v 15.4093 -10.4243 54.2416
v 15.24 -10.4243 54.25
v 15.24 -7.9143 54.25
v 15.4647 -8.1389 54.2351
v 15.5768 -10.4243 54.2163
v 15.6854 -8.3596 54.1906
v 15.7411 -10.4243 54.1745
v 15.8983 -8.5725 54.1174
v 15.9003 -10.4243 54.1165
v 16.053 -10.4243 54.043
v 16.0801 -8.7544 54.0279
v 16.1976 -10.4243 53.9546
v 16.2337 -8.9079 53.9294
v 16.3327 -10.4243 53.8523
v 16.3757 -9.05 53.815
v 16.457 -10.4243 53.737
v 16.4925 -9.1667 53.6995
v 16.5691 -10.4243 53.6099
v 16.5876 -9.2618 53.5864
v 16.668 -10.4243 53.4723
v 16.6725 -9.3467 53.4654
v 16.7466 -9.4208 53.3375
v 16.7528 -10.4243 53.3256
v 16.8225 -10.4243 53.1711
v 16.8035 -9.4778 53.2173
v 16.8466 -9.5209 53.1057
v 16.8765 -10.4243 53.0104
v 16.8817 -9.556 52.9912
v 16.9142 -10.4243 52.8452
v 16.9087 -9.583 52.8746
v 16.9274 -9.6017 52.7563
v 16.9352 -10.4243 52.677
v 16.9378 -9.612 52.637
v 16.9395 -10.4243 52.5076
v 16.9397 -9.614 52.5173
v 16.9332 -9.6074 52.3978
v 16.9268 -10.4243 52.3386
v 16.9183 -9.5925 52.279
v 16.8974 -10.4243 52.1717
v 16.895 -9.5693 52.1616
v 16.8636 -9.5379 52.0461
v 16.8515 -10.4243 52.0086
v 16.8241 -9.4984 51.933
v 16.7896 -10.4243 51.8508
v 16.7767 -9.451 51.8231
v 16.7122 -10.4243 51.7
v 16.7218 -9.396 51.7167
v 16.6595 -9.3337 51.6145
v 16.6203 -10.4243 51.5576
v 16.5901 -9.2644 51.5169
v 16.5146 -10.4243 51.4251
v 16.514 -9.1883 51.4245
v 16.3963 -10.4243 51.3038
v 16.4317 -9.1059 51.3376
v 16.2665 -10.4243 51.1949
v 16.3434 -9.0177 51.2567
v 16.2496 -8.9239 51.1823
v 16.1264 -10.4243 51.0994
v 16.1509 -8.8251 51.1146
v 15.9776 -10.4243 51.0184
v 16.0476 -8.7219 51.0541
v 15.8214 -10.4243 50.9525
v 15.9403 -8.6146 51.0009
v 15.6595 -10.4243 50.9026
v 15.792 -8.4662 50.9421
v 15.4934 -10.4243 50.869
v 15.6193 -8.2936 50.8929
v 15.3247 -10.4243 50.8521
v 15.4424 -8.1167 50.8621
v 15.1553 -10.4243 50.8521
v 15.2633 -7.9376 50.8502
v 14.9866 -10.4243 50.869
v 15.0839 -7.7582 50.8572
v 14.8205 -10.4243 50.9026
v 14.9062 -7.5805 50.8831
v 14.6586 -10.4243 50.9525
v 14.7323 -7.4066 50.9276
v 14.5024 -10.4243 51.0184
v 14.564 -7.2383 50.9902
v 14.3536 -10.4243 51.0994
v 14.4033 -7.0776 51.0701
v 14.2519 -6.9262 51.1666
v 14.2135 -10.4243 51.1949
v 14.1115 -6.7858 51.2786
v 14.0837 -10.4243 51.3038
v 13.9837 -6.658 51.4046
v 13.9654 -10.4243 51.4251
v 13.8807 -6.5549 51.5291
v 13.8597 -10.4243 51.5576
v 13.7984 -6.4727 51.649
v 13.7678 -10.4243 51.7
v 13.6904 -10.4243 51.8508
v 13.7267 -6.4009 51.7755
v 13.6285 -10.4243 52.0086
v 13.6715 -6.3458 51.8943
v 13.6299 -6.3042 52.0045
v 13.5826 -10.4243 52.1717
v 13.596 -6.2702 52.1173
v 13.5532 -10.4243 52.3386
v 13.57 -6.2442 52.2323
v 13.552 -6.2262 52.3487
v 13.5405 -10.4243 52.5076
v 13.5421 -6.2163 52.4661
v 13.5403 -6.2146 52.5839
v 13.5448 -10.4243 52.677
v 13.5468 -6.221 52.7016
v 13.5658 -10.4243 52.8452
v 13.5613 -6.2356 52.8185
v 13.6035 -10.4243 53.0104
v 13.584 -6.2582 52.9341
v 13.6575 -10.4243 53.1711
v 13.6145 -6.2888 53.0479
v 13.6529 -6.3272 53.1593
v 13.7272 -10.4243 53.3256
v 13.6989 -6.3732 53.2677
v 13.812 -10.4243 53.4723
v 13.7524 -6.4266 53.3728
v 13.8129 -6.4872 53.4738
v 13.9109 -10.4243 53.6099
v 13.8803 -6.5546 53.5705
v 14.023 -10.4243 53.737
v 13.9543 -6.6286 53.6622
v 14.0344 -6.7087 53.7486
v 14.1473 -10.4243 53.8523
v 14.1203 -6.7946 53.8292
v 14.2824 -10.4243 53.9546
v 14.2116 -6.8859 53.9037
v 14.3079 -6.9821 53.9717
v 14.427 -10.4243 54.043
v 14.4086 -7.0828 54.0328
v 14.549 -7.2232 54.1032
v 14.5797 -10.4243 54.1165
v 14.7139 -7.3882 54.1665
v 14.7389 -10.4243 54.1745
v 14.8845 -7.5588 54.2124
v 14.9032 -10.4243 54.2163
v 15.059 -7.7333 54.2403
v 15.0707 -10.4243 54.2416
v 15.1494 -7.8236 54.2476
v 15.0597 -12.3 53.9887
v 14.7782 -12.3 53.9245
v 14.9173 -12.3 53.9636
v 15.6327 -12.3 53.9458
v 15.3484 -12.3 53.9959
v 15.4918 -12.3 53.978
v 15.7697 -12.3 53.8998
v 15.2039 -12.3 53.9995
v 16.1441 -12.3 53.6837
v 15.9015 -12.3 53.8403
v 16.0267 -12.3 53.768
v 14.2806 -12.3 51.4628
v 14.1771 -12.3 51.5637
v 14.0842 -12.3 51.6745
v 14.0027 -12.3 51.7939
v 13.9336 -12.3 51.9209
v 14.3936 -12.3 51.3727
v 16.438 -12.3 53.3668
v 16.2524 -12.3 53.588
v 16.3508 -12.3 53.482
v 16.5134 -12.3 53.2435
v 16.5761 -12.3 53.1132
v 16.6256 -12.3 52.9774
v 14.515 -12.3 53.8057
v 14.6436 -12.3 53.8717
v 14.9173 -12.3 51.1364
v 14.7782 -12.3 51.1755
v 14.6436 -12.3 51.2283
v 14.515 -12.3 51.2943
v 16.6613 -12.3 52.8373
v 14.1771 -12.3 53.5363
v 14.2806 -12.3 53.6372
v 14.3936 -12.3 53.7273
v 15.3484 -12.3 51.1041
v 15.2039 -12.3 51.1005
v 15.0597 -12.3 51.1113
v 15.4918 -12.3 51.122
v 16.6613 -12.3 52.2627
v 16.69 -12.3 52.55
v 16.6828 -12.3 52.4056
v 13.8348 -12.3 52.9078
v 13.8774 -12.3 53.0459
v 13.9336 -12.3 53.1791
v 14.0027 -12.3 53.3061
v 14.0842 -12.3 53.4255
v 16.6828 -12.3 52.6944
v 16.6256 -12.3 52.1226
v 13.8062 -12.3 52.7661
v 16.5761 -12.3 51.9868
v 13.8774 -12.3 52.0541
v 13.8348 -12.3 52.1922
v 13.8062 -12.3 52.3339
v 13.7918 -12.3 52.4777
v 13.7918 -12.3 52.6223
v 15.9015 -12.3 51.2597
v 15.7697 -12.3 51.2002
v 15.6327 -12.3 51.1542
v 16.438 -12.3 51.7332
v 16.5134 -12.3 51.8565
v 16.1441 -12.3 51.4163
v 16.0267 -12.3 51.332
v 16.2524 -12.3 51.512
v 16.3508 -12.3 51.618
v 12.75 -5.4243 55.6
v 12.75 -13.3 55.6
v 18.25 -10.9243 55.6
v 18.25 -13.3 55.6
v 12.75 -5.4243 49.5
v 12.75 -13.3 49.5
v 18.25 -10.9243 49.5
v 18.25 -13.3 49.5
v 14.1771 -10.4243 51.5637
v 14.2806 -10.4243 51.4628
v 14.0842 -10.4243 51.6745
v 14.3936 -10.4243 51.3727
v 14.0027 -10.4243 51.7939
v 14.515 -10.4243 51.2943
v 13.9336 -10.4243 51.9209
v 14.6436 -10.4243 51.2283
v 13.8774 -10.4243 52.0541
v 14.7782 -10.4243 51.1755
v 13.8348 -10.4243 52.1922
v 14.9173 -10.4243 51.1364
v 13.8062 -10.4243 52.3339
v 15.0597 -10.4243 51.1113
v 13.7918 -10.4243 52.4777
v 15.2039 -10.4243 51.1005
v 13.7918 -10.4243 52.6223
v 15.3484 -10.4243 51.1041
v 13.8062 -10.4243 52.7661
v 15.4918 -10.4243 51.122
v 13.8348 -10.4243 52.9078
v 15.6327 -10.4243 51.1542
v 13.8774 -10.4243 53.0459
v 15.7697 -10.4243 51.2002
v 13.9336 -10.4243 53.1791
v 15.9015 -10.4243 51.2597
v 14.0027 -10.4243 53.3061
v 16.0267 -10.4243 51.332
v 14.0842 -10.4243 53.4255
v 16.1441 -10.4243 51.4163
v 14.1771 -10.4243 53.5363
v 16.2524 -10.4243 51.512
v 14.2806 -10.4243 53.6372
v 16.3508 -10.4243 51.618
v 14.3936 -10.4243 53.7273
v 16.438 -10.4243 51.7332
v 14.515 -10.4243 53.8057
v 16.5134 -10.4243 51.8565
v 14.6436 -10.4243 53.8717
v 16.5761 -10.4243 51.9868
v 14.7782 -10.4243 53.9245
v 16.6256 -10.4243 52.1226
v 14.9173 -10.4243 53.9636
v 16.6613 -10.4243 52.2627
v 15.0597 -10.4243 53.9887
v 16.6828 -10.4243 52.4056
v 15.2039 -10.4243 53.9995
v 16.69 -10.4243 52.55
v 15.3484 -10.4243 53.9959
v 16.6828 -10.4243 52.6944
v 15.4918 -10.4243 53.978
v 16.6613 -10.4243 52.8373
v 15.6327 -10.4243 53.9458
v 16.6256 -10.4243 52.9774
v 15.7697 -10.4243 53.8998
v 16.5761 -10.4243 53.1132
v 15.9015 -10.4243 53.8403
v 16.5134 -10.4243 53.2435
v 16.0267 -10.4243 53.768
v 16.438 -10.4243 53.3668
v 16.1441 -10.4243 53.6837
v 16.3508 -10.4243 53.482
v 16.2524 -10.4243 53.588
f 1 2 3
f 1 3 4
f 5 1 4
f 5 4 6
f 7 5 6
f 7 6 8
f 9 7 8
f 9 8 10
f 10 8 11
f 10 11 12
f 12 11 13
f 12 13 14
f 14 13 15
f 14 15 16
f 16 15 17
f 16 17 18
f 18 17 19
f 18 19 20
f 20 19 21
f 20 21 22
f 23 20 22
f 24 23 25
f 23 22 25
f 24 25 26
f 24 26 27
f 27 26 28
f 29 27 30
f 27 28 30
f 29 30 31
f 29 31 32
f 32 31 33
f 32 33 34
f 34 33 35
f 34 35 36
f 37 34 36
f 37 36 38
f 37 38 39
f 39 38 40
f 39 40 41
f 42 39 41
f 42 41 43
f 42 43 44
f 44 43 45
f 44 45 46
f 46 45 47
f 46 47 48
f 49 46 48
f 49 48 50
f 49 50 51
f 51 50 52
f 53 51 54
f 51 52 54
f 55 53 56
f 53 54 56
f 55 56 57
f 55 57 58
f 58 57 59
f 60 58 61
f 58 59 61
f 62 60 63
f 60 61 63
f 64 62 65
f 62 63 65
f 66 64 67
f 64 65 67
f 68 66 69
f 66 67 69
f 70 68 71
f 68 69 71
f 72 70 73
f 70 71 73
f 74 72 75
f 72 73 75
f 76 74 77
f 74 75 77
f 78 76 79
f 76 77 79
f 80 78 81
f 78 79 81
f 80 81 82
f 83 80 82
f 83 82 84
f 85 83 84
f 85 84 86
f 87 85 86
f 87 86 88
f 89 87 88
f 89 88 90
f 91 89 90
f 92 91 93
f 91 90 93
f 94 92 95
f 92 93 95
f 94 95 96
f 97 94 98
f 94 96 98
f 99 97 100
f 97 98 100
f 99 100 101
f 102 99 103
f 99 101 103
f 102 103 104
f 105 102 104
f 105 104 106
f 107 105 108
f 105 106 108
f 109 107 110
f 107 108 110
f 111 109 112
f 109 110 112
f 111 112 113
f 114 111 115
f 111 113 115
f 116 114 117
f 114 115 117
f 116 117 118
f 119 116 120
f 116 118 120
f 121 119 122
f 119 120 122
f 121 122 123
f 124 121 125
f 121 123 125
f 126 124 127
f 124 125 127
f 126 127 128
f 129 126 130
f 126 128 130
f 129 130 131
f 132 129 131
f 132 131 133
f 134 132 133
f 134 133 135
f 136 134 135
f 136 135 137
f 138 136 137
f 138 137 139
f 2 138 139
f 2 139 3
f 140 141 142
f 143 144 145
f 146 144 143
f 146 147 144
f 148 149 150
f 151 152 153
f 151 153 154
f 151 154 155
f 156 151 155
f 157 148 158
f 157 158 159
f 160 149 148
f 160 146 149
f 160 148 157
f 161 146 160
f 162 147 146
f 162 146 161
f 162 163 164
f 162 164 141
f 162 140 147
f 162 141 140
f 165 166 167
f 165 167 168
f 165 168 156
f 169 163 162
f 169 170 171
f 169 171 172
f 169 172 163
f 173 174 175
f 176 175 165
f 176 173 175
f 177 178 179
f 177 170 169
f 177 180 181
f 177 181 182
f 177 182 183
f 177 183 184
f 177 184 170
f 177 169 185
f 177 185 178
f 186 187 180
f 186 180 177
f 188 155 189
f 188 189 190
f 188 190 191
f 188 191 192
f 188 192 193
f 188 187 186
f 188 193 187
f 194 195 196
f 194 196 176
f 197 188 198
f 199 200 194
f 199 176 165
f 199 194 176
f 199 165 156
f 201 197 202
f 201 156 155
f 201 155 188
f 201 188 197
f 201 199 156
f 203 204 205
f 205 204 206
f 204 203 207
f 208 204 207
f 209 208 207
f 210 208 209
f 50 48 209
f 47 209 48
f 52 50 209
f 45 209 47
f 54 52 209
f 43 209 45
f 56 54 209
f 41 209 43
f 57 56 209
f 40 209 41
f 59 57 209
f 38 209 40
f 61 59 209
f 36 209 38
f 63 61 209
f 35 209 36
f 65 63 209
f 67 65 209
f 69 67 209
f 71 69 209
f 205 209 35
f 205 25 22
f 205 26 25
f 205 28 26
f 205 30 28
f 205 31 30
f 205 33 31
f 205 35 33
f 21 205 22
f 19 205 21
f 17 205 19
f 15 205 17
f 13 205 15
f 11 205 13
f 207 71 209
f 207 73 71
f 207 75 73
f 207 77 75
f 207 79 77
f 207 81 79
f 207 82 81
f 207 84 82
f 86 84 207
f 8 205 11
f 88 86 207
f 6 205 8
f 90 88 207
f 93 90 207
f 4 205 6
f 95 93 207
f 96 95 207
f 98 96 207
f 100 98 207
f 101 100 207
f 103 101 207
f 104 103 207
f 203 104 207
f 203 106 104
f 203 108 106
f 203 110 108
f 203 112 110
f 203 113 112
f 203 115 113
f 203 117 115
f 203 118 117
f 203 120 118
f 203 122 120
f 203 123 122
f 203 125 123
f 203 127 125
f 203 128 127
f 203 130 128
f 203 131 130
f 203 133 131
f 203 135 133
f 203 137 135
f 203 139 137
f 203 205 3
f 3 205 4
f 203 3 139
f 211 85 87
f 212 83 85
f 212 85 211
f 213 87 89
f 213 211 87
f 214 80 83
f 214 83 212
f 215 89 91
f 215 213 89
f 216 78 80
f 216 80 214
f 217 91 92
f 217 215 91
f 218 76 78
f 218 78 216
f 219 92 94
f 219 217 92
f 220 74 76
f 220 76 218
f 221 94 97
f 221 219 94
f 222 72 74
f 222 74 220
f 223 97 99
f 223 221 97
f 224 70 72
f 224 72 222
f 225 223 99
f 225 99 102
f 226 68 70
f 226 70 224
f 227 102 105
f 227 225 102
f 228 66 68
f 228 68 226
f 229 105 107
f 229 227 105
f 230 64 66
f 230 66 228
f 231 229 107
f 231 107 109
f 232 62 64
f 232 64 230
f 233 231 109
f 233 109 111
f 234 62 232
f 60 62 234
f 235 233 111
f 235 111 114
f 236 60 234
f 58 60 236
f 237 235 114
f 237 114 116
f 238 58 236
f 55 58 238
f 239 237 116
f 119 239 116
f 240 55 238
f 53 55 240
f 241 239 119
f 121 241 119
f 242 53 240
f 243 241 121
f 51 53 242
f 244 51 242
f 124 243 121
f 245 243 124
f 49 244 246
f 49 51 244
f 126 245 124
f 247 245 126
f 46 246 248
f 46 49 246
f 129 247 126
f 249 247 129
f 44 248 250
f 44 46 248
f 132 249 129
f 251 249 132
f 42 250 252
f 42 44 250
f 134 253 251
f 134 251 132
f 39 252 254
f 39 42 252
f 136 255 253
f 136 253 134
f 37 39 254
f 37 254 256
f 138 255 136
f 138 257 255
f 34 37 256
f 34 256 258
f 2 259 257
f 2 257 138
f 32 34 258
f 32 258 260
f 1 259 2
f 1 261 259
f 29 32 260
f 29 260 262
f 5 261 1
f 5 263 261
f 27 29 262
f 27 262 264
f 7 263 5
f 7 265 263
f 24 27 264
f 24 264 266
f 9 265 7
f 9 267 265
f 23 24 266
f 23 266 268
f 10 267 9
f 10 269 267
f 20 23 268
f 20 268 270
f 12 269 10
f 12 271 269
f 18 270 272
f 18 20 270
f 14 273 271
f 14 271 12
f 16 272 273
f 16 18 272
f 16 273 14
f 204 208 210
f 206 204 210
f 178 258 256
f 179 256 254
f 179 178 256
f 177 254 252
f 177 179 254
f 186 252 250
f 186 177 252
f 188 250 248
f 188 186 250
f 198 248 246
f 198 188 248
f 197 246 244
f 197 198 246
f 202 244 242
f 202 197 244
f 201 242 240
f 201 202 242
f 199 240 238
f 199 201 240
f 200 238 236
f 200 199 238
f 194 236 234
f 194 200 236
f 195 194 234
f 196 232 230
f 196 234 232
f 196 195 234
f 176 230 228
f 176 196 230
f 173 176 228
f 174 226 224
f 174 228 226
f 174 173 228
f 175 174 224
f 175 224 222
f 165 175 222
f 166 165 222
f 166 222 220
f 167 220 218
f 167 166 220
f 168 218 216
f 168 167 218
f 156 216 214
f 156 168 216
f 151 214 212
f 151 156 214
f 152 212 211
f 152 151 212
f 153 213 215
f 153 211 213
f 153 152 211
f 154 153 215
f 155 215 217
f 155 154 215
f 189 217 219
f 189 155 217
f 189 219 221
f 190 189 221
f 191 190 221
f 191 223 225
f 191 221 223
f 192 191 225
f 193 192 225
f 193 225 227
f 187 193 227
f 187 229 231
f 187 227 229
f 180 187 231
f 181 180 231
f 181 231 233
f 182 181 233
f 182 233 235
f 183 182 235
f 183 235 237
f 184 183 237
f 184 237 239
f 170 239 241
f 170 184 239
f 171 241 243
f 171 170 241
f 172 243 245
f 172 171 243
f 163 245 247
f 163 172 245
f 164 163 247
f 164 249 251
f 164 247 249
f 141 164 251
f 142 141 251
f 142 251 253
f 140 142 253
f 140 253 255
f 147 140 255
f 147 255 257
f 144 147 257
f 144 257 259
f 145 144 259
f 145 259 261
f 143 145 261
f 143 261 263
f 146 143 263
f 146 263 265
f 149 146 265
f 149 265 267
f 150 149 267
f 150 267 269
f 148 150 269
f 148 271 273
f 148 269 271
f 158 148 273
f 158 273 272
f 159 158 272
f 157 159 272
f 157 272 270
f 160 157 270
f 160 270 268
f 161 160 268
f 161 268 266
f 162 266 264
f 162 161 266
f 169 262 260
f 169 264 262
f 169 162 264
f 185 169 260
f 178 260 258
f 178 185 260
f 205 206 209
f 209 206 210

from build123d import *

# Parameters (mm, degrees)
SKETCH1_W           = 5.5
SKETCH1_H           = 6.1
BOSS_EXTRUDE1_DEPTH = 1
BOSS_EXTRUDE2_REACH = 60.527
SKETCH2_W           = 5.5
SKETCH2_H           = 6.1
SKETCH2_R           = 1.45
SKETCH3_R           = 1.7
CUT_EXTRUDE1_DEPTH  = 5


with BuildPart() as part:
    # Sketch1 → Boss-Extrude1 (new body)
    with BuildSketch(Plane(origin=(0, -13.3, 0), x_dir=(1, 0, 0), z_dir=(0, 1, 0))):
        with Locations((15.5, -52.55)):
            Rectangle(SKETCH1_W, SKETCH1_H)
    extrude(amount=BOSS_EXTRUDE1_DEPTH)

    # Boss-Extrude2: up to this plane
    boss_extrude2_end = Plane(origin=(18.287867966, -10.962132034, -41.256060161), z_dir=(0.7071067811865521, 0.707106781186543, 0))
    # Sketch2 → Boss-Extrude2 (add, up to the surface)
    with BuildSketch(Plane(origin=(0, -12.3, 0), x_dir=(1, 0, 0), z_dir=(0, 1, 0)), mode=Mode.PRIVATE) as boss_extrude2_sk1:
        with Locations((15.5, -52.55)):
            Rectangle(SKETCH2_W, SKETCH2_H)
        with Locations((15.24, -52.55)):
            Circle(SKETCH2_R, mode=Mode.SUBTRACT)
    boss_extrude2_tool1 = split(extrude(boss_extrude2_sk1.sketch, amount=BOSS_EXTRUDE2_REACH, mode=Mode.PRIVATE), bisect_by=boss_extrude2_end, keep=Keep.BOTH, mode=Mode.PRIVATE)
    add(boss_extrude2_tool1.solids().sort_by_distance((12.832134, -12.3, 52.55))[0])

    # Sketch3 → Cut-Extrude1 (cut)
    with BuildSketch(Plane(origin=(0, -5.424264069, 0), x_dir=(1, 0, 0), z_dir=(0, 1, 0))):
        with Locations(Location((15.24, -52.55, 0), (0, 0, 270))):
            Circle(SKETCH3_R)
    extrude(amount=-CUT_EXTRUDE1_DEPTH, mode=Mode.SUBTRACT)


solid = part.part
